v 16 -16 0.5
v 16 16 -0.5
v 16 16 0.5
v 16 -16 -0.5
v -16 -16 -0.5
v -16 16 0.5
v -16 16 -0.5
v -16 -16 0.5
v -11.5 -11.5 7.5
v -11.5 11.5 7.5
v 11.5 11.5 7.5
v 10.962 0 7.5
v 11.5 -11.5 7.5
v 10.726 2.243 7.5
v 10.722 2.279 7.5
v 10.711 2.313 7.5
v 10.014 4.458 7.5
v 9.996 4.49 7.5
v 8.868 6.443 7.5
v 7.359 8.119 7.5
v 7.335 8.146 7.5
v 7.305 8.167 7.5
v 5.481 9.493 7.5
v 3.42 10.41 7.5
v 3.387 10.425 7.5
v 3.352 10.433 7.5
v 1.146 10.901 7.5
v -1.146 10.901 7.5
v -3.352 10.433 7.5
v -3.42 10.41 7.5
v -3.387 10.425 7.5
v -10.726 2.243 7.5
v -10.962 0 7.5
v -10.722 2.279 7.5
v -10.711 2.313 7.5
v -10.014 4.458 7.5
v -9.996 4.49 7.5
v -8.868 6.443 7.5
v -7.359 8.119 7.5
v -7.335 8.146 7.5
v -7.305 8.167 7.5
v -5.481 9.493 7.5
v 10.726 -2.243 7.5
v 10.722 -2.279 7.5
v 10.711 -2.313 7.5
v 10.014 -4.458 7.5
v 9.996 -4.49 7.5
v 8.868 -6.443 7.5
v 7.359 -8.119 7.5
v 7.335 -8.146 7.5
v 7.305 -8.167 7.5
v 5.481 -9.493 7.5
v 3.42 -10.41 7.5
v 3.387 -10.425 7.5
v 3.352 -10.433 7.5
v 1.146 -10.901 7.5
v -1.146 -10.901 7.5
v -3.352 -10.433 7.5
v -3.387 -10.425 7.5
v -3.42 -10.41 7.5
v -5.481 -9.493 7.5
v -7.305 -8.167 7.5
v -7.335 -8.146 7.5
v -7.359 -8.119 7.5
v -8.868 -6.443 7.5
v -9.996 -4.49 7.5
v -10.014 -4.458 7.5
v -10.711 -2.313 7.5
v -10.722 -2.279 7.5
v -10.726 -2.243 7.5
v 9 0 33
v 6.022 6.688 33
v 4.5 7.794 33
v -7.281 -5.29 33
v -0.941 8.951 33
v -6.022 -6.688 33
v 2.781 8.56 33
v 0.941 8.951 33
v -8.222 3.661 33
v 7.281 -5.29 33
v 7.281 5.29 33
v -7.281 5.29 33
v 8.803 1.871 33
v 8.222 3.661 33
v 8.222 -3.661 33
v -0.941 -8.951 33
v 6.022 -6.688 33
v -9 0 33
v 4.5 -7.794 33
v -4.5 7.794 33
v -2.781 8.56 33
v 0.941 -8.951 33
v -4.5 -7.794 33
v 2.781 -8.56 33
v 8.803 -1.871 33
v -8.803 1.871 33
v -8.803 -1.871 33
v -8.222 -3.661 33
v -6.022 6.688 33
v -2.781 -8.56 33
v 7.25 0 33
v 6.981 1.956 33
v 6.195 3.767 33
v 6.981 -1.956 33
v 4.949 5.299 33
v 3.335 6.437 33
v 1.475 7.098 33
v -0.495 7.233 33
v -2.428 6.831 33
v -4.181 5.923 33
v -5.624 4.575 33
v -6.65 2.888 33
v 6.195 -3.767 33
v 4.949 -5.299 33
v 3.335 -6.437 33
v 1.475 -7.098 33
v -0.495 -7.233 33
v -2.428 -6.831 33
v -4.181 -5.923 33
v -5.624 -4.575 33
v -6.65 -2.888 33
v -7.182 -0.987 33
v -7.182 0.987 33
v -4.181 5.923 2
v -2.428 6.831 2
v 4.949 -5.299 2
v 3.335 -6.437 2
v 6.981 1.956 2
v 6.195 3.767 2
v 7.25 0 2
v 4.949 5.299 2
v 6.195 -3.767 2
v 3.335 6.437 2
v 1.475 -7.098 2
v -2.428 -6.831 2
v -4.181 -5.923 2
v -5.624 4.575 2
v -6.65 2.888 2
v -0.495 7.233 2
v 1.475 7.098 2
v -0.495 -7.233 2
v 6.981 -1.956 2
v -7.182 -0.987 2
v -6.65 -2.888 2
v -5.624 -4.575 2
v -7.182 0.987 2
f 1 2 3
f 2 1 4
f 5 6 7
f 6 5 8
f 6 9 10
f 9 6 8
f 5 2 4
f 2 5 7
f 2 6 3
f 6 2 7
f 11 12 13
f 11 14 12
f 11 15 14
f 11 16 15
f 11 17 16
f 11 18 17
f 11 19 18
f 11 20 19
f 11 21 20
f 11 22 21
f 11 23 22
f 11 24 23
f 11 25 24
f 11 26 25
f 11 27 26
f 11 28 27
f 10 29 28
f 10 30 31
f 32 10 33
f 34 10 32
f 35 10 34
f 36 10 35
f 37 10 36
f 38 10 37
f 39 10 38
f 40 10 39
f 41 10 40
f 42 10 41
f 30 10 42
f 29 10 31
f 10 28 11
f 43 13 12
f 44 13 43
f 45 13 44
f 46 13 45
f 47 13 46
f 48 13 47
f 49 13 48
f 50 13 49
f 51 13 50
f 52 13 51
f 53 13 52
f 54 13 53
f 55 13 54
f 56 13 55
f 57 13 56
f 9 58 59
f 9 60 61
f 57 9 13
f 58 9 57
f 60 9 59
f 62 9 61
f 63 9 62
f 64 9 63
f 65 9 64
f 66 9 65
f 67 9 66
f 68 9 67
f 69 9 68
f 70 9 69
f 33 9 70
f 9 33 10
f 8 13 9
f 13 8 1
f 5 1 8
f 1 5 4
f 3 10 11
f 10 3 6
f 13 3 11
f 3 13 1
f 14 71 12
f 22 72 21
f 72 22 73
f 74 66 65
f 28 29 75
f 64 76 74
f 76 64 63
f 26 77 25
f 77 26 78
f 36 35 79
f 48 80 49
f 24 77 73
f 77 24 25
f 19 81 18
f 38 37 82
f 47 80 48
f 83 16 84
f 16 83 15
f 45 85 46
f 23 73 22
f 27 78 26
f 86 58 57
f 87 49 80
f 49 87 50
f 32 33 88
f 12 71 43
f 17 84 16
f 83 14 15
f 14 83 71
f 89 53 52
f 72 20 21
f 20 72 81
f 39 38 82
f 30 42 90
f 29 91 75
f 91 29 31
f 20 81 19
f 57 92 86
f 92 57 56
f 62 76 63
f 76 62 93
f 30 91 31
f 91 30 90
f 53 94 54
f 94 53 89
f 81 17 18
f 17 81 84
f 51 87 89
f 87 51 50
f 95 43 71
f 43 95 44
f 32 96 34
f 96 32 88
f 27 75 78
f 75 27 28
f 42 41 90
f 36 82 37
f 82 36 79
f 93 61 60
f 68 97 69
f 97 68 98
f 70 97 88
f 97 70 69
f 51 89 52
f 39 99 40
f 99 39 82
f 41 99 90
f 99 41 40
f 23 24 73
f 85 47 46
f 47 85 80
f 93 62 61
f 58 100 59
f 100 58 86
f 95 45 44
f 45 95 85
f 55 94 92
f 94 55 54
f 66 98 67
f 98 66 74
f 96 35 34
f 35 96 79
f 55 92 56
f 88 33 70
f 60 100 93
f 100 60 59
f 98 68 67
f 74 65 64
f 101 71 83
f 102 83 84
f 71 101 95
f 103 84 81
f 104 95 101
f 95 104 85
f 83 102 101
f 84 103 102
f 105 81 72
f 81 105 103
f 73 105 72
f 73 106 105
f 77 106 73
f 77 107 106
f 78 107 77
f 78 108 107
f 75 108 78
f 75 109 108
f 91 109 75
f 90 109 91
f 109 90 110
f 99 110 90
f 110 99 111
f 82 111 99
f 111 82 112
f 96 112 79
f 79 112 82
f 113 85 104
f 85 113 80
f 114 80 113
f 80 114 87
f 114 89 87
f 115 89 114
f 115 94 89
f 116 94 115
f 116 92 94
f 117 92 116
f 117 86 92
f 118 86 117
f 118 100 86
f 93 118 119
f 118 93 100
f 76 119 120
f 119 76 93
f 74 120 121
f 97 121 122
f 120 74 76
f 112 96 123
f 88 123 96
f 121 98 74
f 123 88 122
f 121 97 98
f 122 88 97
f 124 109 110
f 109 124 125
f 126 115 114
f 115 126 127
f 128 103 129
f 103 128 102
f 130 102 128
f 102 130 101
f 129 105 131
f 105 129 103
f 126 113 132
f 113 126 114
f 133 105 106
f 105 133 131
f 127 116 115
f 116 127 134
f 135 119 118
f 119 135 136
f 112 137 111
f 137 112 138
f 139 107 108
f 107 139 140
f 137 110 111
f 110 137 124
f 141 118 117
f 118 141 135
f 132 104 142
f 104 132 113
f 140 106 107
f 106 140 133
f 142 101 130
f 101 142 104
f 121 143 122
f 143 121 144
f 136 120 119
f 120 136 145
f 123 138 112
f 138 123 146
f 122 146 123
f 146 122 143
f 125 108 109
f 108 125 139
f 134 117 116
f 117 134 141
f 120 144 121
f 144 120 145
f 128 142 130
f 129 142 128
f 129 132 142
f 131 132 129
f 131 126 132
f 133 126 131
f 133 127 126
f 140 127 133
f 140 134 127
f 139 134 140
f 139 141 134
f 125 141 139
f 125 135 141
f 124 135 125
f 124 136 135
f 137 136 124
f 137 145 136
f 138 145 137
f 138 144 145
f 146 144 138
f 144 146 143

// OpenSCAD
Base_Height = 7;

//Tripod Base
module base() {
	hull() {
		cube(size = [32,32,1], center = true);
 		translate([0,0,Base_Height]) cube(size = [23,23,1], center = true);
	}
}
//Holder Withlout subtraction for rod
module holder() {
	translate([0,0,Base_Height]) cylinder (h=26, r1 = 11, r2 = 9);
}

//Entire Assembly without subtraction for rod
module assembly(){
	base();
	holder();
}

//Diffrence of the assembly and the rod so that is goes into the base a bit.
difference (){
	assembly();
	translate([0,0,Base_Height-5]) cylinder(h=50, r=7.25);
}
